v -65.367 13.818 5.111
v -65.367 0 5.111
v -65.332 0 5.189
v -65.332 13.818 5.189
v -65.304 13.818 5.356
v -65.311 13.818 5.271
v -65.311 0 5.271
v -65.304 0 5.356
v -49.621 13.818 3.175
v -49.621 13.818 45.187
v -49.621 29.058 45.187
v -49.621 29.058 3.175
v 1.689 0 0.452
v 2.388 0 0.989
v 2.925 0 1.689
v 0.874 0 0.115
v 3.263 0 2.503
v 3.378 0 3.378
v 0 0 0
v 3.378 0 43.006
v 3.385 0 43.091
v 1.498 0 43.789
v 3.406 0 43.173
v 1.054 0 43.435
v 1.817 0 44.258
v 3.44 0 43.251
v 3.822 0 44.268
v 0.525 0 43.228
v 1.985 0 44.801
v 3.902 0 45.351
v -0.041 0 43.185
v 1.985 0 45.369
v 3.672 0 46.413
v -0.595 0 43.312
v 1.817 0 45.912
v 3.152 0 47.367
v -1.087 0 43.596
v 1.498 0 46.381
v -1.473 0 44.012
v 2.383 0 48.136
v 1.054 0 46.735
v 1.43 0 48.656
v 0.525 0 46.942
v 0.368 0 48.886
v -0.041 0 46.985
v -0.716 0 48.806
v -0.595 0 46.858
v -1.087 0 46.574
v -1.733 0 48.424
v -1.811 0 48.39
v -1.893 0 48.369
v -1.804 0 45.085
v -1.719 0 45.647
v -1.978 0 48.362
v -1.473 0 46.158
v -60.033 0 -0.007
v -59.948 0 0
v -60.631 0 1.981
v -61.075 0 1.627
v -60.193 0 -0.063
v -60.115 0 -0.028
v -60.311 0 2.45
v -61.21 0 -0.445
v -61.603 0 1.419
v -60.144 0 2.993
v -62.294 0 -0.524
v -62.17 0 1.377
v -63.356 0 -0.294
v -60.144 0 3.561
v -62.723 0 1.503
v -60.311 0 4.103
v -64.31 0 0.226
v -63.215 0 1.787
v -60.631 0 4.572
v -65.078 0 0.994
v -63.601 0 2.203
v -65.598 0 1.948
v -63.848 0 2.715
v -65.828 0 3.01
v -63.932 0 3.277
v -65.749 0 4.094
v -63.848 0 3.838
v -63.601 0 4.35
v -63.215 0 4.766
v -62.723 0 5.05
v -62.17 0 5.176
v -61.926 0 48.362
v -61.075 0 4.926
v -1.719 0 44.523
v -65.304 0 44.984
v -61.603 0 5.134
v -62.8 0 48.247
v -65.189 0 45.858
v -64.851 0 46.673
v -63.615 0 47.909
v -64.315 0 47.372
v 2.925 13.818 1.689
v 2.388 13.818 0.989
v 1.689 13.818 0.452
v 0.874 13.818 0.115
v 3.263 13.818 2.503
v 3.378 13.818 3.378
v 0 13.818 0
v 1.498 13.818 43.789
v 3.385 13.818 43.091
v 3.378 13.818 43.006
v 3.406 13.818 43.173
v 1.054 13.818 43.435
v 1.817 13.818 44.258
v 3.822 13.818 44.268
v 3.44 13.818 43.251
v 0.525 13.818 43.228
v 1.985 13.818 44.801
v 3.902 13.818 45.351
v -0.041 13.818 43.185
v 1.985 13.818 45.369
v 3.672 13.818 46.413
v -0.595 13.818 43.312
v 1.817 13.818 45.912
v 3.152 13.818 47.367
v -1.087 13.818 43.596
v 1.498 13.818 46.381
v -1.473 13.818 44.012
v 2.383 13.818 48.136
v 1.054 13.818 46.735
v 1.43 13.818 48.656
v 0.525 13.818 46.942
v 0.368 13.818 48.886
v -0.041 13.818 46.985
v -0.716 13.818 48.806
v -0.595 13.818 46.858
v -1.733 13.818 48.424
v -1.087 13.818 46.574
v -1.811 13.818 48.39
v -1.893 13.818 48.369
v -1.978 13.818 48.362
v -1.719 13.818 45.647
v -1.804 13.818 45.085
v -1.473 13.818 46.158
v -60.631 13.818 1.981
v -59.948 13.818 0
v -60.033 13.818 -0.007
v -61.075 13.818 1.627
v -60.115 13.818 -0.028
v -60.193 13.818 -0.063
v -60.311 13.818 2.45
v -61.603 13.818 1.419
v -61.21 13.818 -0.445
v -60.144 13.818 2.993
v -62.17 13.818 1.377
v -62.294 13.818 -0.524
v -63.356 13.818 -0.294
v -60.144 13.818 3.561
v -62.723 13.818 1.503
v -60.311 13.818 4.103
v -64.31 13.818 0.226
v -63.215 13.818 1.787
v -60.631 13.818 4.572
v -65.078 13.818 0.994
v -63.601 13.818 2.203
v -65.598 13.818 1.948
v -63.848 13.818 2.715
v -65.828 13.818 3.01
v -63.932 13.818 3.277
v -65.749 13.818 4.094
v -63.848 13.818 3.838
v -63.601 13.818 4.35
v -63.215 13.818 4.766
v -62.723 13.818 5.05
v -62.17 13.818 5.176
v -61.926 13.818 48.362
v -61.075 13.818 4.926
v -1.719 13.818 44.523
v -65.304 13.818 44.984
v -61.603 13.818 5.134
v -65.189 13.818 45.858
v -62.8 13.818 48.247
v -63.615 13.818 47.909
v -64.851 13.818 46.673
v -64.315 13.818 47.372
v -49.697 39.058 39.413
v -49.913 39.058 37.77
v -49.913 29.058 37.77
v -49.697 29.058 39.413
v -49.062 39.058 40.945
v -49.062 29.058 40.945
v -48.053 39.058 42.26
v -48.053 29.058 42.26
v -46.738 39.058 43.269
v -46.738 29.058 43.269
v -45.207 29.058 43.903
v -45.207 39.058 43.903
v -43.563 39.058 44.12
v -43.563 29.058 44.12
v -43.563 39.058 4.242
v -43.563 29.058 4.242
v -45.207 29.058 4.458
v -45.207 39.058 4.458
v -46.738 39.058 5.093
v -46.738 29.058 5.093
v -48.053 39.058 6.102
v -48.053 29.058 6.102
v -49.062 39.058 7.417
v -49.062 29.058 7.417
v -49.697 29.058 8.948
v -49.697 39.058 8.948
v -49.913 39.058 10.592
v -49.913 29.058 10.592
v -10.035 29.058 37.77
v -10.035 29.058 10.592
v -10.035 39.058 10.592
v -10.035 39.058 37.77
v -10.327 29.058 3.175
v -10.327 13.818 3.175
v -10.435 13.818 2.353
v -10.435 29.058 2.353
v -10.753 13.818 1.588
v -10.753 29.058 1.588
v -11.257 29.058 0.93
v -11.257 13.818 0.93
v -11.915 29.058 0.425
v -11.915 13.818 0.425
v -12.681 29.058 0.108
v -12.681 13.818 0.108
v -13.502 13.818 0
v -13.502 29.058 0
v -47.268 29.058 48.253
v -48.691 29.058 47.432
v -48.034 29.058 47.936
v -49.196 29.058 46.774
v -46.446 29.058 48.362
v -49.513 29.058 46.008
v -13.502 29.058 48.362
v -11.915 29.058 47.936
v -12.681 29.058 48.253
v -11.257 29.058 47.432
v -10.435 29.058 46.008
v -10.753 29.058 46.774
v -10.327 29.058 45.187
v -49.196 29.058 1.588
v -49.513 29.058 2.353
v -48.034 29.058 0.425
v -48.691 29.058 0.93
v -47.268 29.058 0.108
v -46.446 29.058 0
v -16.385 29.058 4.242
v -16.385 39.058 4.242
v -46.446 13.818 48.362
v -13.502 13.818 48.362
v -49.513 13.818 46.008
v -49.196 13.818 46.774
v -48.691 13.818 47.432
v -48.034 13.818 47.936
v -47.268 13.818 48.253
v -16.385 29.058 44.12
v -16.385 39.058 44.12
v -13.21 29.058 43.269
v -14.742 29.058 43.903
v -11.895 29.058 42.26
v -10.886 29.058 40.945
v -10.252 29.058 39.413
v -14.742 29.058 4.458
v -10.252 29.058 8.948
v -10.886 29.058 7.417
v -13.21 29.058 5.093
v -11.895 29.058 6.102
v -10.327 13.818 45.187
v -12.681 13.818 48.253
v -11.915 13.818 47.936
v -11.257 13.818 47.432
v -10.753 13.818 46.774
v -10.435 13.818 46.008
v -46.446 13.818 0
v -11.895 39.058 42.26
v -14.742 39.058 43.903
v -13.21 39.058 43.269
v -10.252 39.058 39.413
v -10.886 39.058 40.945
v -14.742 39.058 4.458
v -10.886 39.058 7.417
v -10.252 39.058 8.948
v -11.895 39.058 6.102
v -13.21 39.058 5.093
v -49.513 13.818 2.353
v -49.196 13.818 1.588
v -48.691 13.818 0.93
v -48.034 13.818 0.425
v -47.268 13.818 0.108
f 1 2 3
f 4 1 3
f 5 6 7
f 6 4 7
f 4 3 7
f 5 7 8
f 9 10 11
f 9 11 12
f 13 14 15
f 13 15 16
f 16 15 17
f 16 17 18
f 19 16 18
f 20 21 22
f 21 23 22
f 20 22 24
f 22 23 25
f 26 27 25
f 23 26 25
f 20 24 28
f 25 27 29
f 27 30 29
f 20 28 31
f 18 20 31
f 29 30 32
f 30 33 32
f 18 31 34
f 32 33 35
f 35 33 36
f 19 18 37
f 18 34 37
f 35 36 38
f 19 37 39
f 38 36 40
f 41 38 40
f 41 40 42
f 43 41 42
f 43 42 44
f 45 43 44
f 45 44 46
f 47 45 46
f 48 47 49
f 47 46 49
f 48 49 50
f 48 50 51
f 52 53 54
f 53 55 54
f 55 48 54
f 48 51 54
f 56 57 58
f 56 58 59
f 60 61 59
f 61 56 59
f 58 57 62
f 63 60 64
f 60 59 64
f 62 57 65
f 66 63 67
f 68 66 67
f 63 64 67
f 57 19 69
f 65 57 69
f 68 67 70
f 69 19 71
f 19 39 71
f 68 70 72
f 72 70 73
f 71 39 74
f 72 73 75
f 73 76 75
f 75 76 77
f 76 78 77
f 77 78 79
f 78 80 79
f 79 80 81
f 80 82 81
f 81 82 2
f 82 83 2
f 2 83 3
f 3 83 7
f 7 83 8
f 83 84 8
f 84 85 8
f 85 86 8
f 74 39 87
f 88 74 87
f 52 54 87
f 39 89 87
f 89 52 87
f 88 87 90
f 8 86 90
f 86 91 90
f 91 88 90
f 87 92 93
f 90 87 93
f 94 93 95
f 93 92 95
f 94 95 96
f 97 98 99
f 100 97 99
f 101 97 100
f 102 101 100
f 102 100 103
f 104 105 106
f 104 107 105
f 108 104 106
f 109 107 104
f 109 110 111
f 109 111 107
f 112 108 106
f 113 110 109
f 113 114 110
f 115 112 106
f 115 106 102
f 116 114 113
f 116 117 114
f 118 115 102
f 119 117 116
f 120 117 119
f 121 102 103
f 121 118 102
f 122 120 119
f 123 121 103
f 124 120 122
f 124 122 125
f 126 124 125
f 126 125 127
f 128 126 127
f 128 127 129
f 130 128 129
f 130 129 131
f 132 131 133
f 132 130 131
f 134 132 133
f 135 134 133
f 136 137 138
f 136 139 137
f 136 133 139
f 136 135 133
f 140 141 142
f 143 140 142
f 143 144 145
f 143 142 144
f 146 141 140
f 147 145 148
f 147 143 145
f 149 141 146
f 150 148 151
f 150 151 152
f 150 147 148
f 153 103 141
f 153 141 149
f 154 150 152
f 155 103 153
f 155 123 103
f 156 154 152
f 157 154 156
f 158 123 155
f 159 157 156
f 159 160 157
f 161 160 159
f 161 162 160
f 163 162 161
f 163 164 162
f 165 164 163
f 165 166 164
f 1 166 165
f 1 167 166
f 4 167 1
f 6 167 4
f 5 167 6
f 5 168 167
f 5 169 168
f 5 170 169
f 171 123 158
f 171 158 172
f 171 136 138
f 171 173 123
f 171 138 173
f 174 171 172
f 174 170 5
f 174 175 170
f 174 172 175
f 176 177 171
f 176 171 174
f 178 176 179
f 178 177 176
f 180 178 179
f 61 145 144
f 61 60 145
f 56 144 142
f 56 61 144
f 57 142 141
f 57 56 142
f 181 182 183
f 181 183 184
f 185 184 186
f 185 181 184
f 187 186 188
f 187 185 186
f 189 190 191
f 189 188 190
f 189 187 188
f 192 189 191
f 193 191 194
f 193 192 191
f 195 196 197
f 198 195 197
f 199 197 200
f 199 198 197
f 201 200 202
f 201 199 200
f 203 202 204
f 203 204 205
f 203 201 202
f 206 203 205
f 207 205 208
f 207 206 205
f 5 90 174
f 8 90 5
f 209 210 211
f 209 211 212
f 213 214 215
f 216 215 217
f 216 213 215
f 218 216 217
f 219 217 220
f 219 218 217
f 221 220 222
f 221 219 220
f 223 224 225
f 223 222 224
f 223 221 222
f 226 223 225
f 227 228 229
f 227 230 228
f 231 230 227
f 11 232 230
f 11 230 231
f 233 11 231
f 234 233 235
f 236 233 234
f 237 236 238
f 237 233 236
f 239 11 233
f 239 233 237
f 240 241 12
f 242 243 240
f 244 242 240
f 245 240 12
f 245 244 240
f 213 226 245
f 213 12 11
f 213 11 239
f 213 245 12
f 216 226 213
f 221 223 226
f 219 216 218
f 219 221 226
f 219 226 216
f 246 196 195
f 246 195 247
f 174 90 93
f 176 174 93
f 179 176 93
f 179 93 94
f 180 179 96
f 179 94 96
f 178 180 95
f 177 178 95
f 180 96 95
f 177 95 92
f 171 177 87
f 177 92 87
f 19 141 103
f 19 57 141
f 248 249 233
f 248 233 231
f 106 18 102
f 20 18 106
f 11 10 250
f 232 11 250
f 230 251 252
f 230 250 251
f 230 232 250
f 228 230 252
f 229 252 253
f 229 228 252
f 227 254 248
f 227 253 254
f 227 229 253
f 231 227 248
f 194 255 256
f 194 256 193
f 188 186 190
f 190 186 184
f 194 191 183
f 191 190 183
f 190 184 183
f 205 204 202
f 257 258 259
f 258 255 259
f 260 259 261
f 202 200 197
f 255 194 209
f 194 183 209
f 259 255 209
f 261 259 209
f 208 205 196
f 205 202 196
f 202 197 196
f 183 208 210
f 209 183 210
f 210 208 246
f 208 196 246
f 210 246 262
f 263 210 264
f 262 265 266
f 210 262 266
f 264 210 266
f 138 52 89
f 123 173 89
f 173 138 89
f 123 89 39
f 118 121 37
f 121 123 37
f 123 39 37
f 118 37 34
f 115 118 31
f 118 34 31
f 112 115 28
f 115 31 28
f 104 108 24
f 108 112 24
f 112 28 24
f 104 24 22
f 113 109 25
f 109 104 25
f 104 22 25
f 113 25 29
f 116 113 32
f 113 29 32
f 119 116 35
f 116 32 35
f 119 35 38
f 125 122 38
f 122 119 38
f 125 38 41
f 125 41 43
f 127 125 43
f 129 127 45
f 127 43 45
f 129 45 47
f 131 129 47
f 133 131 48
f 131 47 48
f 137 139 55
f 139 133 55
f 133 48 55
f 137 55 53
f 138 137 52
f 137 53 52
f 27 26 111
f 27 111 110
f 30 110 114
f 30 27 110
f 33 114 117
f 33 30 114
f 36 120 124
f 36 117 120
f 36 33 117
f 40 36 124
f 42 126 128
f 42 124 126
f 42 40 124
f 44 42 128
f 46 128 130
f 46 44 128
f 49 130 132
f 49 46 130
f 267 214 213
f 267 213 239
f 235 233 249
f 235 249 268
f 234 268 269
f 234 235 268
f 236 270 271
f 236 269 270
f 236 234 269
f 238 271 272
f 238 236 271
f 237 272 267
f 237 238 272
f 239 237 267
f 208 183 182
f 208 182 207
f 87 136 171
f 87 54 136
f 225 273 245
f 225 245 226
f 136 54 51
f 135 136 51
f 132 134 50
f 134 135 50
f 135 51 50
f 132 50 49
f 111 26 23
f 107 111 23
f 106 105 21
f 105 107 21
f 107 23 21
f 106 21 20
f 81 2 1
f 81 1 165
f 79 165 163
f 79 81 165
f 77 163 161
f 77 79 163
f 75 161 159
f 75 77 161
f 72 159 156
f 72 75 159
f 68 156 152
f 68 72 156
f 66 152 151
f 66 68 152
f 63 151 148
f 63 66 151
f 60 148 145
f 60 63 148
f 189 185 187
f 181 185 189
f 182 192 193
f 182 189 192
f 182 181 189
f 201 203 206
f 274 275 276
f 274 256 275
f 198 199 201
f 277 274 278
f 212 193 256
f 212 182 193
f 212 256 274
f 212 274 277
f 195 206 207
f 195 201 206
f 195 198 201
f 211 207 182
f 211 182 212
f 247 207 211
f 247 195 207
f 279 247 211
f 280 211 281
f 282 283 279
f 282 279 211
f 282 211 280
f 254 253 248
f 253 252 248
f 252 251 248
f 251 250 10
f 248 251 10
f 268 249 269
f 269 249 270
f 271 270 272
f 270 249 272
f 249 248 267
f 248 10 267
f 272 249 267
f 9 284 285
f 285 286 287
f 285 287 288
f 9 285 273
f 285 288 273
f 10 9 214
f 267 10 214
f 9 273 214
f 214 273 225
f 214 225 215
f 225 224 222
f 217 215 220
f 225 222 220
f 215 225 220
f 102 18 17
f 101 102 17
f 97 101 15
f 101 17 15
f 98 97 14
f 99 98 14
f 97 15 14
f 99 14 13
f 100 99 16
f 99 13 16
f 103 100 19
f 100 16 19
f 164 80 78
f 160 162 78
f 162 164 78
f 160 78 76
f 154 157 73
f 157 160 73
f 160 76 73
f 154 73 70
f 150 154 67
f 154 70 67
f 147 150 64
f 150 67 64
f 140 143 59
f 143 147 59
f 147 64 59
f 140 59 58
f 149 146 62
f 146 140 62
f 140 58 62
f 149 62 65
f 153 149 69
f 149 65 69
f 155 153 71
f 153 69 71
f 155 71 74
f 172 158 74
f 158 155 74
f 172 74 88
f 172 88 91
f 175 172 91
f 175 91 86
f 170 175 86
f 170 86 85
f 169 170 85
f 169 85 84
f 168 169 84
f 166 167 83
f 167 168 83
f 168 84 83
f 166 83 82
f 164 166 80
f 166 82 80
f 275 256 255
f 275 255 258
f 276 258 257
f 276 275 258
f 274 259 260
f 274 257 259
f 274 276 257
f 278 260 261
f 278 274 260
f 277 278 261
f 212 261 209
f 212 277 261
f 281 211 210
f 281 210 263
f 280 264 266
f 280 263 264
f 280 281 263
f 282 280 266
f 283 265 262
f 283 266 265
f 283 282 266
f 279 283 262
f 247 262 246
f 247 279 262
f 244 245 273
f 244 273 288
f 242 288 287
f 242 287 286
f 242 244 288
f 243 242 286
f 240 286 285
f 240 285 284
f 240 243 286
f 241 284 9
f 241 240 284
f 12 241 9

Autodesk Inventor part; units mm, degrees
ref_plane "YZ Plane" through (0, 0, 0) normal (1, 0, 0) x (0, 1, 0)
ref_plane "XZ Plane" through (0, 0, 0) normal (0, 1, 0) x (-1, 0, 0)
ref_plane "XY Plane" through (0, 0, 0) normal (0, 0, 1) x (1, 0, 0)
sketch "Sketch2" plane through (0, 0, 0) normal (0, 1, 0) x (-1, 0, 0)
  line L0 (-3.3777, 3.3777) -> (-3.3777, 43.0061)
  ellipse E0 centre (0.001, 3.3787) end of major axis (-2.3884, 0.9892) minor radius 3.3782 (-3.3777, 3.3777) -> (0, 0) ccw
  line L1 (59.9484, 0) -> (0, 0)
  ellipse E1 centre (59.9793, -0.3859) end of major axis (60.4086, -0.4945) minor radius 0.3819 (60.193, -0.0627) -> (59.9484, 0) ccw
  arc A0 (60.193, -0.0627) -> (65.3667, 5.111) centre (62.0273, 3.2766) ccw
  arc A1 (65.3039, 5.3555) -> (65.3667, 5.111) centre (65.8118, 5.3555) ccw
  line L2 (65.3039, 44.9839) -> (65.3039, 5.3555)
  ellipse E2 centre (61.9252, 44.9829) end of major axis (59.5357, 42.5934) minor radius 3.3782 (65.3039, 44.9839) -> (61.9262, 48.3616) ccw
  line L3 (1.9778, 48.3616) -> (61.9262, 48.3616)
  arc A2 (1.7333, 48.4243) -> (1.9778, 48.3616) centre (1.9778, 48.8695) ccw
  arc A3 (1.7333, 48.4243) -> (-3.4404, 43.2506) centre (-0.1011, 45.085) ccw
  arc A4 (-3.3777, 43.0061) -> (-3.4404, 43.2506) centre (-3.8856, 43.0061) ccw
  arc A5 (-0.0268, 47.0408) -> (-2.0588, 45.0088) centre (-0.0268, 45.0088) ccw
  line L4 (59.9191, 47.0408) -> (-0.0268, 47.0408) construction
  arc A6 (63.9831, 42.9768) -> (59.9191, 47.0408) centre (59.9191, 42.9768) ccw construction
  line L5 (63.9831, 3.3528) -> (63.9831, 42.9768) construction
  arc A7 (61.9511, 1.3208) -> (63.9831, 3.3528) centre (61.9511, 3.3528) ccw
  line L6 (2.0052, 1.3208) -> (61.9511, 1.3208) construction
  arc A8 (-2.0588, 5.3848) -> (2.0052, 1.3208) centre (2.0052, 5.3848) ccw construction
  line L7 (-2.0588, 45.0088) -> (-2.0588, 5.3848) construction
  circle A9 centre (-0.1011, 45.085) radius 1.905
  circle A10 centre (62.0273, 3.2766) radius 1.905
extrude "Extrusion1" add sketch "Sketch2" along normal blind 13.8176
sketch "Sketch3" plane through (0, 13.8176, 0) normal (0, 1, 0) x (1, 0, 0)
  line L0 (0, 0) -> (-59.9484, 0) construction
  line L1 (-61.9262, -48.3616) -> (-1.9778, -48.3616) construction
  line L2 (-49.6211, 0) -> (-10.3273, 0)
  line L3 (-10.3273, 0) -> (-10.3273, -48.3616)
  line L4 (-10.3273, -48.3616) -> (-49.6211, -48.3616)
  line L5 (-49.6211, -48.3616) -> (-49.6211, 0)
  point P0 (-29.9742, 0)
  dimension "d2" = 39.2938
extrude "Extrusion2" add sketch "Sketch3" along normal blind 15.24 separate body
fillet "Fillet1" radius 3.175 4 edges at (-49.6211, 21.4376, 0) (-10.3273, 21.4376, 0) (-10.3273, 21.4376, 48.3616) (-49.6211, 21.4376, 48.3616)
sketch "Sketch4" plane through (0, 29.0576, 0) normal (0, 1, 0) x (1, 0, 0)
  line L0 (-13.5023, 0) -> (-46.4461, 0) construction
  line L1 (-49.6211, -3.175) -> (-49.6211, -45.1866) construction
  line L2 (-49.9132, -4.2418) -> (-10.0352, -4.2418)
  line L3 (-10.0352, -4.2418) -> (-10.0352, -44.1198)
  line L4 (-10.0352, -44.1198) -> (-49.9132, -44.1198)
  line L5 (-49.9132, -44.1198) -> (-49.9132, -4.2418)
  point P0 (0, 0)
  point P1 (-29.9742, -4.2418)
  point P2 (-29.9742, 0)
  point P3 (-49.9132, -24.1808)
  point P4 (-49.6211, -24.1808)
  dimension "d7" = 39.878
  dimension "d8" = 39.878
extrude "Extrusion3" add sketch "Sketch4" along normal blind 10 separate body
fillet "Fillet2" radius 6.35 4 edges at (-49.9132, 34.0576, 44.1198) (-10.0352, 34.0576, 44.1198) (-10.0352, 34.0576, 4.2418) (-49.9132, 34.0576, 4.2418)
properties part number "Talon Controller" material "Nylon 6/6"
